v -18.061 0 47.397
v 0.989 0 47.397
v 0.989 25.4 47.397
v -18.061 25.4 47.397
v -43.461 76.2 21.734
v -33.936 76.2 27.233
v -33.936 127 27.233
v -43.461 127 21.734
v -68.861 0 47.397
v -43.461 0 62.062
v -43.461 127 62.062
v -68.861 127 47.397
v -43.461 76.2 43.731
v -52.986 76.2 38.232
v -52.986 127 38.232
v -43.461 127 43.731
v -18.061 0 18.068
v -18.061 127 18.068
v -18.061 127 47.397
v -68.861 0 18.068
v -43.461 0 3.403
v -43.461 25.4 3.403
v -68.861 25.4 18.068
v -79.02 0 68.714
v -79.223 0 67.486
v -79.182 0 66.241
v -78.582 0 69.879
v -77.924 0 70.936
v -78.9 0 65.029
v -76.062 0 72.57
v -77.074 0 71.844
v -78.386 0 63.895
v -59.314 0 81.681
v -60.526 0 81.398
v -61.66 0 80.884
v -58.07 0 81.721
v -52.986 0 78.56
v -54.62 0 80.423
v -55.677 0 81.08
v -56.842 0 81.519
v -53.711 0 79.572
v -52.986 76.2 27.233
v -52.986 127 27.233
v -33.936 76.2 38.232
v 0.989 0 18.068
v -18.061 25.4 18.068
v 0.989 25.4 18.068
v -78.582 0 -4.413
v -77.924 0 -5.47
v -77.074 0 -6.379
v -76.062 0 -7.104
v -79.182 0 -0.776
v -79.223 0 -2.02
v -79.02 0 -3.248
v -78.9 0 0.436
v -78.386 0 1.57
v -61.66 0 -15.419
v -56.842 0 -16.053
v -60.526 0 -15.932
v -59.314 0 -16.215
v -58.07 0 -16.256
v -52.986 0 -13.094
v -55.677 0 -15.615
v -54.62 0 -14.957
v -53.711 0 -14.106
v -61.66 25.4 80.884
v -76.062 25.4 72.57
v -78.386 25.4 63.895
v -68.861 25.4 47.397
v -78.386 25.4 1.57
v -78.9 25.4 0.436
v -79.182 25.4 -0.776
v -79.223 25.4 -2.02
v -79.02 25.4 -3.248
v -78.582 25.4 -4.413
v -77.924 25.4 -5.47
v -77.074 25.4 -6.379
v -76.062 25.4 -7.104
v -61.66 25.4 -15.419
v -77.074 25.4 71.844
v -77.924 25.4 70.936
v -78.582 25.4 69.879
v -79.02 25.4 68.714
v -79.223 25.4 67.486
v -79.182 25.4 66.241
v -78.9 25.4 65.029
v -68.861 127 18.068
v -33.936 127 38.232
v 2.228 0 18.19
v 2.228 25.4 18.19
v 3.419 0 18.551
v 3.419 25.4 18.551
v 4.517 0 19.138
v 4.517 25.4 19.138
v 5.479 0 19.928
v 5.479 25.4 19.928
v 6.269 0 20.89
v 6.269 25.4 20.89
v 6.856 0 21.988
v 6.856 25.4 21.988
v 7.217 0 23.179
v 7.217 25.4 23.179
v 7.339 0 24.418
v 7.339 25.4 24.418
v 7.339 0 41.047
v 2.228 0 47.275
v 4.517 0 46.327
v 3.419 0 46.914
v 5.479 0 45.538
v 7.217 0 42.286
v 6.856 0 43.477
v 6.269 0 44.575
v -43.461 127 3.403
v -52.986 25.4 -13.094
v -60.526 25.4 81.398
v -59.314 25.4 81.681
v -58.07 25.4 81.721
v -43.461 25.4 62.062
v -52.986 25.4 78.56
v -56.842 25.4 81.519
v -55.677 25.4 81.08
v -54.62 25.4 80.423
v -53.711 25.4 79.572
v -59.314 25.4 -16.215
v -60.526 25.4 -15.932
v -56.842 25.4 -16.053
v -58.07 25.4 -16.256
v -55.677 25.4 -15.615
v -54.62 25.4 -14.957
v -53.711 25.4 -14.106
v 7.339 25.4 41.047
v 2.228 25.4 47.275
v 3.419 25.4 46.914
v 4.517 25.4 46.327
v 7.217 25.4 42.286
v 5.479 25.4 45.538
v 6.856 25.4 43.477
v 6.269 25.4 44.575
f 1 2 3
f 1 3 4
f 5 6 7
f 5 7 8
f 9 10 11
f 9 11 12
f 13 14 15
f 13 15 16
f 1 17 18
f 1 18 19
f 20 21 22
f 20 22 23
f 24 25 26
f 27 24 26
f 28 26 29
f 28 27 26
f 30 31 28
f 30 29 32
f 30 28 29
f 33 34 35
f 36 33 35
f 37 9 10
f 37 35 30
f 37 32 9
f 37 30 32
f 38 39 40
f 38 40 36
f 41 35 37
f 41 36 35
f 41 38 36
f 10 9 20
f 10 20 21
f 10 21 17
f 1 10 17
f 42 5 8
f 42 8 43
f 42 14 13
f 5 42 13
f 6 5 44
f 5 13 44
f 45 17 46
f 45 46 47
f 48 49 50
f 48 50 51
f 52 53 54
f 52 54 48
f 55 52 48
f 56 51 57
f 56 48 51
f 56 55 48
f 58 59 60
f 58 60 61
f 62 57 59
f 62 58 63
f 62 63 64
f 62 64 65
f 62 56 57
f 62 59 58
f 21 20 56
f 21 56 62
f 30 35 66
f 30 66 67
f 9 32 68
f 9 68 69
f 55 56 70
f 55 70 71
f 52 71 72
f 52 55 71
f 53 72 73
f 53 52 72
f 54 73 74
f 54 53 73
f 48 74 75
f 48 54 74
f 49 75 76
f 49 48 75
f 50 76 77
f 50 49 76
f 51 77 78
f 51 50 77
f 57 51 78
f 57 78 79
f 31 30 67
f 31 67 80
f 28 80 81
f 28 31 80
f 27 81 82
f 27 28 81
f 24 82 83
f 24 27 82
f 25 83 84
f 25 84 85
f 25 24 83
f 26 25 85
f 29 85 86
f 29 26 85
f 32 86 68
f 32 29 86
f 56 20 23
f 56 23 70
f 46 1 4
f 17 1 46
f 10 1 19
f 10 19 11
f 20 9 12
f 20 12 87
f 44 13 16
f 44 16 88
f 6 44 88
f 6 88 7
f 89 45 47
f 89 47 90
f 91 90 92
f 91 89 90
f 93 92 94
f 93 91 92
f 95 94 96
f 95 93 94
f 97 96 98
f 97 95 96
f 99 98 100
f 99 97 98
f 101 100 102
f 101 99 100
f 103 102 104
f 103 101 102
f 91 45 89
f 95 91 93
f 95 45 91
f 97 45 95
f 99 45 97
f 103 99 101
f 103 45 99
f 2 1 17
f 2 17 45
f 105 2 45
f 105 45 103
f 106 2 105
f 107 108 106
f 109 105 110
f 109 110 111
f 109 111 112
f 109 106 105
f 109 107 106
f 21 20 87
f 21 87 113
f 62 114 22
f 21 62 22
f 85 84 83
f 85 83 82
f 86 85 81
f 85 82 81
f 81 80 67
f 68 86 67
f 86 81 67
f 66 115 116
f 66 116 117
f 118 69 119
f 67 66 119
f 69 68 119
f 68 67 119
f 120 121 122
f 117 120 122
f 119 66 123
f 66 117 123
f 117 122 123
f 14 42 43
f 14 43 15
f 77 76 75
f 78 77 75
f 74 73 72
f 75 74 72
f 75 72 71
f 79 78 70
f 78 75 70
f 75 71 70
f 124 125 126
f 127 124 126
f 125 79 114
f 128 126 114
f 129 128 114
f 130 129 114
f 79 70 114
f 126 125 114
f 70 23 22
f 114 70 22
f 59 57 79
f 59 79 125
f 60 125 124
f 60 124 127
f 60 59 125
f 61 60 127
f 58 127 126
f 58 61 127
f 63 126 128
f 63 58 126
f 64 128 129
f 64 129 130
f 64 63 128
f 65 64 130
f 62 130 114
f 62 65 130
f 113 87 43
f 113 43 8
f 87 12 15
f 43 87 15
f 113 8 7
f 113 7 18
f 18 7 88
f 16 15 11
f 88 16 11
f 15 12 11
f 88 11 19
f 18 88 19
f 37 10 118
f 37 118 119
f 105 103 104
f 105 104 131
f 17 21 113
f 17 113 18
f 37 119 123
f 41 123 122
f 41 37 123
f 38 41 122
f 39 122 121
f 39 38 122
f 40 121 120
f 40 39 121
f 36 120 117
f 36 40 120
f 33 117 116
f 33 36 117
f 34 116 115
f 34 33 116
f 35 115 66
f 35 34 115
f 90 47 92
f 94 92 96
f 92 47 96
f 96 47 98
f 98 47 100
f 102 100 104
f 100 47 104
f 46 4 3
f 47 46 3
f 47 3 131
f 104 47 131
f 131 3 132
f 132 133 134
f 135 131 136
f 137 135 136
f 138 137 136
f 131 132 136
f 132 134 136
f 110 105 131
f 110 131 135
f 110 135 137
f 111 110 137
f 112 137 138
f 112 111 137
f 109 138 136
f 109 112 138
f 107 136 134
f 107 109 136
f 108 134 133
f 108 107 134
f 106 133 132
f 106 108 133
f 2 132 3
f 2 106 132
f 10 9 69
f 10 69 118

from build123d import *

# Parameters (mm, degrees)
F1_DEPTH = 76.2
F2_DEPTH = 127
F3_DEPTH = 25.4


with BuildPart() as f1:
    # F0 (on Front) → F1 (new body)
    with BuildSketch(Plane.XZ):
        Polygon((-33.935963, 27.233497), (-33.935963, 38.23202), (-43.460963, 43.731281), (-52.985963, 38.23202), (-52.985963, 27.233497), (-43.460963, 21.734236), align=None)
    extrude(amount=-F1_DEPTH)

    # F0 (on Front) → F2 (join)
    with BuildSketch(Plane.XZ):
        Polygon((-18.060963, 18.068062), (-18.060963, 47.397456), (-43.460963, 62.062152), (-68.860963, 47.397456), (-68.860963, 18.068062), (-43.460963, 3.403365), align=None)
        Polygon((-43.460963, 43.731281), (-33.935963, 38.23202), (-33.935963, 27.233497), (-43.460963, 21.734236), (-52.985963, 27.233497), (-52.985963, 38.23202), align=None, mode=Mode.SUBTRACT)
    extrude(amount=-F2_DEPTH)


with BuildPart() as f3:
    # F0 (on Front) → F3 (new body)
    with BuildSketch(Plane.XZ):
        with BuildLine():
            Line((-68.860963, 47.397456), (-43.460963, 62.062152))
            Line((-43.460963, 62.062152), (-52.985963, 78.559936))
            ThreePointArc((-52.985963, 78.559936), (-56.841724, 81.518565), (-61.660224, 80.884198))
            Line((-61.660224, 80.884198), (-76.061702, 72.569501))
            ThreePointArc((-76.061702, 72.569501), (-79.020331, 68.71374), (-78.385963, 63.895239))
            Line((-78.385963, 63.895239), (-68.860963, 47.397456))
        make_face()
        with BuildLine():
            Line((-52.985963, -13.094419), (-43.460963, 3.403365))
            Line((-43.460963, 3.403365), (-68.860963, 18.068062))
            Line((-68.860963, 18.068062), (-78.385963, 1.570278))
            ThreePointArc((-78.385963, 1.570278), (-79.020331, -3.248223), (-76.061702, -7.103983))
            Line((-76.061702, -7.103983), (-61.660224, -15.41868))
            ThreePointArc((-61.660224, -15.41868), (-56.841724, -16.053048), (-52.985963, -13.094419))
        make_face()
        with BuildLine():
            Line((0.989037, 47.397456), (-18.060963, 47.397456))
            Line((-18.060963, 47.397456), (-18.060963, 18.068062))
            Line((-18.060963, 18.068062), (0.989037, 18.068062))
            ThreePointArc((0.989037, 18.068062), (5.479165, 19.927934), (7.339037, 24.418062))
            Line((7.339037, 24.418062), (7.339037, 41.047456))
            ThreePointArc((7.339037, 41.047456), (5.479165, 45.537584), (0.989037, 47.397456))
        make_face()
    extrude(amount=-F3_DEPTH)


solid = Compound([f1.part, f3.part])
